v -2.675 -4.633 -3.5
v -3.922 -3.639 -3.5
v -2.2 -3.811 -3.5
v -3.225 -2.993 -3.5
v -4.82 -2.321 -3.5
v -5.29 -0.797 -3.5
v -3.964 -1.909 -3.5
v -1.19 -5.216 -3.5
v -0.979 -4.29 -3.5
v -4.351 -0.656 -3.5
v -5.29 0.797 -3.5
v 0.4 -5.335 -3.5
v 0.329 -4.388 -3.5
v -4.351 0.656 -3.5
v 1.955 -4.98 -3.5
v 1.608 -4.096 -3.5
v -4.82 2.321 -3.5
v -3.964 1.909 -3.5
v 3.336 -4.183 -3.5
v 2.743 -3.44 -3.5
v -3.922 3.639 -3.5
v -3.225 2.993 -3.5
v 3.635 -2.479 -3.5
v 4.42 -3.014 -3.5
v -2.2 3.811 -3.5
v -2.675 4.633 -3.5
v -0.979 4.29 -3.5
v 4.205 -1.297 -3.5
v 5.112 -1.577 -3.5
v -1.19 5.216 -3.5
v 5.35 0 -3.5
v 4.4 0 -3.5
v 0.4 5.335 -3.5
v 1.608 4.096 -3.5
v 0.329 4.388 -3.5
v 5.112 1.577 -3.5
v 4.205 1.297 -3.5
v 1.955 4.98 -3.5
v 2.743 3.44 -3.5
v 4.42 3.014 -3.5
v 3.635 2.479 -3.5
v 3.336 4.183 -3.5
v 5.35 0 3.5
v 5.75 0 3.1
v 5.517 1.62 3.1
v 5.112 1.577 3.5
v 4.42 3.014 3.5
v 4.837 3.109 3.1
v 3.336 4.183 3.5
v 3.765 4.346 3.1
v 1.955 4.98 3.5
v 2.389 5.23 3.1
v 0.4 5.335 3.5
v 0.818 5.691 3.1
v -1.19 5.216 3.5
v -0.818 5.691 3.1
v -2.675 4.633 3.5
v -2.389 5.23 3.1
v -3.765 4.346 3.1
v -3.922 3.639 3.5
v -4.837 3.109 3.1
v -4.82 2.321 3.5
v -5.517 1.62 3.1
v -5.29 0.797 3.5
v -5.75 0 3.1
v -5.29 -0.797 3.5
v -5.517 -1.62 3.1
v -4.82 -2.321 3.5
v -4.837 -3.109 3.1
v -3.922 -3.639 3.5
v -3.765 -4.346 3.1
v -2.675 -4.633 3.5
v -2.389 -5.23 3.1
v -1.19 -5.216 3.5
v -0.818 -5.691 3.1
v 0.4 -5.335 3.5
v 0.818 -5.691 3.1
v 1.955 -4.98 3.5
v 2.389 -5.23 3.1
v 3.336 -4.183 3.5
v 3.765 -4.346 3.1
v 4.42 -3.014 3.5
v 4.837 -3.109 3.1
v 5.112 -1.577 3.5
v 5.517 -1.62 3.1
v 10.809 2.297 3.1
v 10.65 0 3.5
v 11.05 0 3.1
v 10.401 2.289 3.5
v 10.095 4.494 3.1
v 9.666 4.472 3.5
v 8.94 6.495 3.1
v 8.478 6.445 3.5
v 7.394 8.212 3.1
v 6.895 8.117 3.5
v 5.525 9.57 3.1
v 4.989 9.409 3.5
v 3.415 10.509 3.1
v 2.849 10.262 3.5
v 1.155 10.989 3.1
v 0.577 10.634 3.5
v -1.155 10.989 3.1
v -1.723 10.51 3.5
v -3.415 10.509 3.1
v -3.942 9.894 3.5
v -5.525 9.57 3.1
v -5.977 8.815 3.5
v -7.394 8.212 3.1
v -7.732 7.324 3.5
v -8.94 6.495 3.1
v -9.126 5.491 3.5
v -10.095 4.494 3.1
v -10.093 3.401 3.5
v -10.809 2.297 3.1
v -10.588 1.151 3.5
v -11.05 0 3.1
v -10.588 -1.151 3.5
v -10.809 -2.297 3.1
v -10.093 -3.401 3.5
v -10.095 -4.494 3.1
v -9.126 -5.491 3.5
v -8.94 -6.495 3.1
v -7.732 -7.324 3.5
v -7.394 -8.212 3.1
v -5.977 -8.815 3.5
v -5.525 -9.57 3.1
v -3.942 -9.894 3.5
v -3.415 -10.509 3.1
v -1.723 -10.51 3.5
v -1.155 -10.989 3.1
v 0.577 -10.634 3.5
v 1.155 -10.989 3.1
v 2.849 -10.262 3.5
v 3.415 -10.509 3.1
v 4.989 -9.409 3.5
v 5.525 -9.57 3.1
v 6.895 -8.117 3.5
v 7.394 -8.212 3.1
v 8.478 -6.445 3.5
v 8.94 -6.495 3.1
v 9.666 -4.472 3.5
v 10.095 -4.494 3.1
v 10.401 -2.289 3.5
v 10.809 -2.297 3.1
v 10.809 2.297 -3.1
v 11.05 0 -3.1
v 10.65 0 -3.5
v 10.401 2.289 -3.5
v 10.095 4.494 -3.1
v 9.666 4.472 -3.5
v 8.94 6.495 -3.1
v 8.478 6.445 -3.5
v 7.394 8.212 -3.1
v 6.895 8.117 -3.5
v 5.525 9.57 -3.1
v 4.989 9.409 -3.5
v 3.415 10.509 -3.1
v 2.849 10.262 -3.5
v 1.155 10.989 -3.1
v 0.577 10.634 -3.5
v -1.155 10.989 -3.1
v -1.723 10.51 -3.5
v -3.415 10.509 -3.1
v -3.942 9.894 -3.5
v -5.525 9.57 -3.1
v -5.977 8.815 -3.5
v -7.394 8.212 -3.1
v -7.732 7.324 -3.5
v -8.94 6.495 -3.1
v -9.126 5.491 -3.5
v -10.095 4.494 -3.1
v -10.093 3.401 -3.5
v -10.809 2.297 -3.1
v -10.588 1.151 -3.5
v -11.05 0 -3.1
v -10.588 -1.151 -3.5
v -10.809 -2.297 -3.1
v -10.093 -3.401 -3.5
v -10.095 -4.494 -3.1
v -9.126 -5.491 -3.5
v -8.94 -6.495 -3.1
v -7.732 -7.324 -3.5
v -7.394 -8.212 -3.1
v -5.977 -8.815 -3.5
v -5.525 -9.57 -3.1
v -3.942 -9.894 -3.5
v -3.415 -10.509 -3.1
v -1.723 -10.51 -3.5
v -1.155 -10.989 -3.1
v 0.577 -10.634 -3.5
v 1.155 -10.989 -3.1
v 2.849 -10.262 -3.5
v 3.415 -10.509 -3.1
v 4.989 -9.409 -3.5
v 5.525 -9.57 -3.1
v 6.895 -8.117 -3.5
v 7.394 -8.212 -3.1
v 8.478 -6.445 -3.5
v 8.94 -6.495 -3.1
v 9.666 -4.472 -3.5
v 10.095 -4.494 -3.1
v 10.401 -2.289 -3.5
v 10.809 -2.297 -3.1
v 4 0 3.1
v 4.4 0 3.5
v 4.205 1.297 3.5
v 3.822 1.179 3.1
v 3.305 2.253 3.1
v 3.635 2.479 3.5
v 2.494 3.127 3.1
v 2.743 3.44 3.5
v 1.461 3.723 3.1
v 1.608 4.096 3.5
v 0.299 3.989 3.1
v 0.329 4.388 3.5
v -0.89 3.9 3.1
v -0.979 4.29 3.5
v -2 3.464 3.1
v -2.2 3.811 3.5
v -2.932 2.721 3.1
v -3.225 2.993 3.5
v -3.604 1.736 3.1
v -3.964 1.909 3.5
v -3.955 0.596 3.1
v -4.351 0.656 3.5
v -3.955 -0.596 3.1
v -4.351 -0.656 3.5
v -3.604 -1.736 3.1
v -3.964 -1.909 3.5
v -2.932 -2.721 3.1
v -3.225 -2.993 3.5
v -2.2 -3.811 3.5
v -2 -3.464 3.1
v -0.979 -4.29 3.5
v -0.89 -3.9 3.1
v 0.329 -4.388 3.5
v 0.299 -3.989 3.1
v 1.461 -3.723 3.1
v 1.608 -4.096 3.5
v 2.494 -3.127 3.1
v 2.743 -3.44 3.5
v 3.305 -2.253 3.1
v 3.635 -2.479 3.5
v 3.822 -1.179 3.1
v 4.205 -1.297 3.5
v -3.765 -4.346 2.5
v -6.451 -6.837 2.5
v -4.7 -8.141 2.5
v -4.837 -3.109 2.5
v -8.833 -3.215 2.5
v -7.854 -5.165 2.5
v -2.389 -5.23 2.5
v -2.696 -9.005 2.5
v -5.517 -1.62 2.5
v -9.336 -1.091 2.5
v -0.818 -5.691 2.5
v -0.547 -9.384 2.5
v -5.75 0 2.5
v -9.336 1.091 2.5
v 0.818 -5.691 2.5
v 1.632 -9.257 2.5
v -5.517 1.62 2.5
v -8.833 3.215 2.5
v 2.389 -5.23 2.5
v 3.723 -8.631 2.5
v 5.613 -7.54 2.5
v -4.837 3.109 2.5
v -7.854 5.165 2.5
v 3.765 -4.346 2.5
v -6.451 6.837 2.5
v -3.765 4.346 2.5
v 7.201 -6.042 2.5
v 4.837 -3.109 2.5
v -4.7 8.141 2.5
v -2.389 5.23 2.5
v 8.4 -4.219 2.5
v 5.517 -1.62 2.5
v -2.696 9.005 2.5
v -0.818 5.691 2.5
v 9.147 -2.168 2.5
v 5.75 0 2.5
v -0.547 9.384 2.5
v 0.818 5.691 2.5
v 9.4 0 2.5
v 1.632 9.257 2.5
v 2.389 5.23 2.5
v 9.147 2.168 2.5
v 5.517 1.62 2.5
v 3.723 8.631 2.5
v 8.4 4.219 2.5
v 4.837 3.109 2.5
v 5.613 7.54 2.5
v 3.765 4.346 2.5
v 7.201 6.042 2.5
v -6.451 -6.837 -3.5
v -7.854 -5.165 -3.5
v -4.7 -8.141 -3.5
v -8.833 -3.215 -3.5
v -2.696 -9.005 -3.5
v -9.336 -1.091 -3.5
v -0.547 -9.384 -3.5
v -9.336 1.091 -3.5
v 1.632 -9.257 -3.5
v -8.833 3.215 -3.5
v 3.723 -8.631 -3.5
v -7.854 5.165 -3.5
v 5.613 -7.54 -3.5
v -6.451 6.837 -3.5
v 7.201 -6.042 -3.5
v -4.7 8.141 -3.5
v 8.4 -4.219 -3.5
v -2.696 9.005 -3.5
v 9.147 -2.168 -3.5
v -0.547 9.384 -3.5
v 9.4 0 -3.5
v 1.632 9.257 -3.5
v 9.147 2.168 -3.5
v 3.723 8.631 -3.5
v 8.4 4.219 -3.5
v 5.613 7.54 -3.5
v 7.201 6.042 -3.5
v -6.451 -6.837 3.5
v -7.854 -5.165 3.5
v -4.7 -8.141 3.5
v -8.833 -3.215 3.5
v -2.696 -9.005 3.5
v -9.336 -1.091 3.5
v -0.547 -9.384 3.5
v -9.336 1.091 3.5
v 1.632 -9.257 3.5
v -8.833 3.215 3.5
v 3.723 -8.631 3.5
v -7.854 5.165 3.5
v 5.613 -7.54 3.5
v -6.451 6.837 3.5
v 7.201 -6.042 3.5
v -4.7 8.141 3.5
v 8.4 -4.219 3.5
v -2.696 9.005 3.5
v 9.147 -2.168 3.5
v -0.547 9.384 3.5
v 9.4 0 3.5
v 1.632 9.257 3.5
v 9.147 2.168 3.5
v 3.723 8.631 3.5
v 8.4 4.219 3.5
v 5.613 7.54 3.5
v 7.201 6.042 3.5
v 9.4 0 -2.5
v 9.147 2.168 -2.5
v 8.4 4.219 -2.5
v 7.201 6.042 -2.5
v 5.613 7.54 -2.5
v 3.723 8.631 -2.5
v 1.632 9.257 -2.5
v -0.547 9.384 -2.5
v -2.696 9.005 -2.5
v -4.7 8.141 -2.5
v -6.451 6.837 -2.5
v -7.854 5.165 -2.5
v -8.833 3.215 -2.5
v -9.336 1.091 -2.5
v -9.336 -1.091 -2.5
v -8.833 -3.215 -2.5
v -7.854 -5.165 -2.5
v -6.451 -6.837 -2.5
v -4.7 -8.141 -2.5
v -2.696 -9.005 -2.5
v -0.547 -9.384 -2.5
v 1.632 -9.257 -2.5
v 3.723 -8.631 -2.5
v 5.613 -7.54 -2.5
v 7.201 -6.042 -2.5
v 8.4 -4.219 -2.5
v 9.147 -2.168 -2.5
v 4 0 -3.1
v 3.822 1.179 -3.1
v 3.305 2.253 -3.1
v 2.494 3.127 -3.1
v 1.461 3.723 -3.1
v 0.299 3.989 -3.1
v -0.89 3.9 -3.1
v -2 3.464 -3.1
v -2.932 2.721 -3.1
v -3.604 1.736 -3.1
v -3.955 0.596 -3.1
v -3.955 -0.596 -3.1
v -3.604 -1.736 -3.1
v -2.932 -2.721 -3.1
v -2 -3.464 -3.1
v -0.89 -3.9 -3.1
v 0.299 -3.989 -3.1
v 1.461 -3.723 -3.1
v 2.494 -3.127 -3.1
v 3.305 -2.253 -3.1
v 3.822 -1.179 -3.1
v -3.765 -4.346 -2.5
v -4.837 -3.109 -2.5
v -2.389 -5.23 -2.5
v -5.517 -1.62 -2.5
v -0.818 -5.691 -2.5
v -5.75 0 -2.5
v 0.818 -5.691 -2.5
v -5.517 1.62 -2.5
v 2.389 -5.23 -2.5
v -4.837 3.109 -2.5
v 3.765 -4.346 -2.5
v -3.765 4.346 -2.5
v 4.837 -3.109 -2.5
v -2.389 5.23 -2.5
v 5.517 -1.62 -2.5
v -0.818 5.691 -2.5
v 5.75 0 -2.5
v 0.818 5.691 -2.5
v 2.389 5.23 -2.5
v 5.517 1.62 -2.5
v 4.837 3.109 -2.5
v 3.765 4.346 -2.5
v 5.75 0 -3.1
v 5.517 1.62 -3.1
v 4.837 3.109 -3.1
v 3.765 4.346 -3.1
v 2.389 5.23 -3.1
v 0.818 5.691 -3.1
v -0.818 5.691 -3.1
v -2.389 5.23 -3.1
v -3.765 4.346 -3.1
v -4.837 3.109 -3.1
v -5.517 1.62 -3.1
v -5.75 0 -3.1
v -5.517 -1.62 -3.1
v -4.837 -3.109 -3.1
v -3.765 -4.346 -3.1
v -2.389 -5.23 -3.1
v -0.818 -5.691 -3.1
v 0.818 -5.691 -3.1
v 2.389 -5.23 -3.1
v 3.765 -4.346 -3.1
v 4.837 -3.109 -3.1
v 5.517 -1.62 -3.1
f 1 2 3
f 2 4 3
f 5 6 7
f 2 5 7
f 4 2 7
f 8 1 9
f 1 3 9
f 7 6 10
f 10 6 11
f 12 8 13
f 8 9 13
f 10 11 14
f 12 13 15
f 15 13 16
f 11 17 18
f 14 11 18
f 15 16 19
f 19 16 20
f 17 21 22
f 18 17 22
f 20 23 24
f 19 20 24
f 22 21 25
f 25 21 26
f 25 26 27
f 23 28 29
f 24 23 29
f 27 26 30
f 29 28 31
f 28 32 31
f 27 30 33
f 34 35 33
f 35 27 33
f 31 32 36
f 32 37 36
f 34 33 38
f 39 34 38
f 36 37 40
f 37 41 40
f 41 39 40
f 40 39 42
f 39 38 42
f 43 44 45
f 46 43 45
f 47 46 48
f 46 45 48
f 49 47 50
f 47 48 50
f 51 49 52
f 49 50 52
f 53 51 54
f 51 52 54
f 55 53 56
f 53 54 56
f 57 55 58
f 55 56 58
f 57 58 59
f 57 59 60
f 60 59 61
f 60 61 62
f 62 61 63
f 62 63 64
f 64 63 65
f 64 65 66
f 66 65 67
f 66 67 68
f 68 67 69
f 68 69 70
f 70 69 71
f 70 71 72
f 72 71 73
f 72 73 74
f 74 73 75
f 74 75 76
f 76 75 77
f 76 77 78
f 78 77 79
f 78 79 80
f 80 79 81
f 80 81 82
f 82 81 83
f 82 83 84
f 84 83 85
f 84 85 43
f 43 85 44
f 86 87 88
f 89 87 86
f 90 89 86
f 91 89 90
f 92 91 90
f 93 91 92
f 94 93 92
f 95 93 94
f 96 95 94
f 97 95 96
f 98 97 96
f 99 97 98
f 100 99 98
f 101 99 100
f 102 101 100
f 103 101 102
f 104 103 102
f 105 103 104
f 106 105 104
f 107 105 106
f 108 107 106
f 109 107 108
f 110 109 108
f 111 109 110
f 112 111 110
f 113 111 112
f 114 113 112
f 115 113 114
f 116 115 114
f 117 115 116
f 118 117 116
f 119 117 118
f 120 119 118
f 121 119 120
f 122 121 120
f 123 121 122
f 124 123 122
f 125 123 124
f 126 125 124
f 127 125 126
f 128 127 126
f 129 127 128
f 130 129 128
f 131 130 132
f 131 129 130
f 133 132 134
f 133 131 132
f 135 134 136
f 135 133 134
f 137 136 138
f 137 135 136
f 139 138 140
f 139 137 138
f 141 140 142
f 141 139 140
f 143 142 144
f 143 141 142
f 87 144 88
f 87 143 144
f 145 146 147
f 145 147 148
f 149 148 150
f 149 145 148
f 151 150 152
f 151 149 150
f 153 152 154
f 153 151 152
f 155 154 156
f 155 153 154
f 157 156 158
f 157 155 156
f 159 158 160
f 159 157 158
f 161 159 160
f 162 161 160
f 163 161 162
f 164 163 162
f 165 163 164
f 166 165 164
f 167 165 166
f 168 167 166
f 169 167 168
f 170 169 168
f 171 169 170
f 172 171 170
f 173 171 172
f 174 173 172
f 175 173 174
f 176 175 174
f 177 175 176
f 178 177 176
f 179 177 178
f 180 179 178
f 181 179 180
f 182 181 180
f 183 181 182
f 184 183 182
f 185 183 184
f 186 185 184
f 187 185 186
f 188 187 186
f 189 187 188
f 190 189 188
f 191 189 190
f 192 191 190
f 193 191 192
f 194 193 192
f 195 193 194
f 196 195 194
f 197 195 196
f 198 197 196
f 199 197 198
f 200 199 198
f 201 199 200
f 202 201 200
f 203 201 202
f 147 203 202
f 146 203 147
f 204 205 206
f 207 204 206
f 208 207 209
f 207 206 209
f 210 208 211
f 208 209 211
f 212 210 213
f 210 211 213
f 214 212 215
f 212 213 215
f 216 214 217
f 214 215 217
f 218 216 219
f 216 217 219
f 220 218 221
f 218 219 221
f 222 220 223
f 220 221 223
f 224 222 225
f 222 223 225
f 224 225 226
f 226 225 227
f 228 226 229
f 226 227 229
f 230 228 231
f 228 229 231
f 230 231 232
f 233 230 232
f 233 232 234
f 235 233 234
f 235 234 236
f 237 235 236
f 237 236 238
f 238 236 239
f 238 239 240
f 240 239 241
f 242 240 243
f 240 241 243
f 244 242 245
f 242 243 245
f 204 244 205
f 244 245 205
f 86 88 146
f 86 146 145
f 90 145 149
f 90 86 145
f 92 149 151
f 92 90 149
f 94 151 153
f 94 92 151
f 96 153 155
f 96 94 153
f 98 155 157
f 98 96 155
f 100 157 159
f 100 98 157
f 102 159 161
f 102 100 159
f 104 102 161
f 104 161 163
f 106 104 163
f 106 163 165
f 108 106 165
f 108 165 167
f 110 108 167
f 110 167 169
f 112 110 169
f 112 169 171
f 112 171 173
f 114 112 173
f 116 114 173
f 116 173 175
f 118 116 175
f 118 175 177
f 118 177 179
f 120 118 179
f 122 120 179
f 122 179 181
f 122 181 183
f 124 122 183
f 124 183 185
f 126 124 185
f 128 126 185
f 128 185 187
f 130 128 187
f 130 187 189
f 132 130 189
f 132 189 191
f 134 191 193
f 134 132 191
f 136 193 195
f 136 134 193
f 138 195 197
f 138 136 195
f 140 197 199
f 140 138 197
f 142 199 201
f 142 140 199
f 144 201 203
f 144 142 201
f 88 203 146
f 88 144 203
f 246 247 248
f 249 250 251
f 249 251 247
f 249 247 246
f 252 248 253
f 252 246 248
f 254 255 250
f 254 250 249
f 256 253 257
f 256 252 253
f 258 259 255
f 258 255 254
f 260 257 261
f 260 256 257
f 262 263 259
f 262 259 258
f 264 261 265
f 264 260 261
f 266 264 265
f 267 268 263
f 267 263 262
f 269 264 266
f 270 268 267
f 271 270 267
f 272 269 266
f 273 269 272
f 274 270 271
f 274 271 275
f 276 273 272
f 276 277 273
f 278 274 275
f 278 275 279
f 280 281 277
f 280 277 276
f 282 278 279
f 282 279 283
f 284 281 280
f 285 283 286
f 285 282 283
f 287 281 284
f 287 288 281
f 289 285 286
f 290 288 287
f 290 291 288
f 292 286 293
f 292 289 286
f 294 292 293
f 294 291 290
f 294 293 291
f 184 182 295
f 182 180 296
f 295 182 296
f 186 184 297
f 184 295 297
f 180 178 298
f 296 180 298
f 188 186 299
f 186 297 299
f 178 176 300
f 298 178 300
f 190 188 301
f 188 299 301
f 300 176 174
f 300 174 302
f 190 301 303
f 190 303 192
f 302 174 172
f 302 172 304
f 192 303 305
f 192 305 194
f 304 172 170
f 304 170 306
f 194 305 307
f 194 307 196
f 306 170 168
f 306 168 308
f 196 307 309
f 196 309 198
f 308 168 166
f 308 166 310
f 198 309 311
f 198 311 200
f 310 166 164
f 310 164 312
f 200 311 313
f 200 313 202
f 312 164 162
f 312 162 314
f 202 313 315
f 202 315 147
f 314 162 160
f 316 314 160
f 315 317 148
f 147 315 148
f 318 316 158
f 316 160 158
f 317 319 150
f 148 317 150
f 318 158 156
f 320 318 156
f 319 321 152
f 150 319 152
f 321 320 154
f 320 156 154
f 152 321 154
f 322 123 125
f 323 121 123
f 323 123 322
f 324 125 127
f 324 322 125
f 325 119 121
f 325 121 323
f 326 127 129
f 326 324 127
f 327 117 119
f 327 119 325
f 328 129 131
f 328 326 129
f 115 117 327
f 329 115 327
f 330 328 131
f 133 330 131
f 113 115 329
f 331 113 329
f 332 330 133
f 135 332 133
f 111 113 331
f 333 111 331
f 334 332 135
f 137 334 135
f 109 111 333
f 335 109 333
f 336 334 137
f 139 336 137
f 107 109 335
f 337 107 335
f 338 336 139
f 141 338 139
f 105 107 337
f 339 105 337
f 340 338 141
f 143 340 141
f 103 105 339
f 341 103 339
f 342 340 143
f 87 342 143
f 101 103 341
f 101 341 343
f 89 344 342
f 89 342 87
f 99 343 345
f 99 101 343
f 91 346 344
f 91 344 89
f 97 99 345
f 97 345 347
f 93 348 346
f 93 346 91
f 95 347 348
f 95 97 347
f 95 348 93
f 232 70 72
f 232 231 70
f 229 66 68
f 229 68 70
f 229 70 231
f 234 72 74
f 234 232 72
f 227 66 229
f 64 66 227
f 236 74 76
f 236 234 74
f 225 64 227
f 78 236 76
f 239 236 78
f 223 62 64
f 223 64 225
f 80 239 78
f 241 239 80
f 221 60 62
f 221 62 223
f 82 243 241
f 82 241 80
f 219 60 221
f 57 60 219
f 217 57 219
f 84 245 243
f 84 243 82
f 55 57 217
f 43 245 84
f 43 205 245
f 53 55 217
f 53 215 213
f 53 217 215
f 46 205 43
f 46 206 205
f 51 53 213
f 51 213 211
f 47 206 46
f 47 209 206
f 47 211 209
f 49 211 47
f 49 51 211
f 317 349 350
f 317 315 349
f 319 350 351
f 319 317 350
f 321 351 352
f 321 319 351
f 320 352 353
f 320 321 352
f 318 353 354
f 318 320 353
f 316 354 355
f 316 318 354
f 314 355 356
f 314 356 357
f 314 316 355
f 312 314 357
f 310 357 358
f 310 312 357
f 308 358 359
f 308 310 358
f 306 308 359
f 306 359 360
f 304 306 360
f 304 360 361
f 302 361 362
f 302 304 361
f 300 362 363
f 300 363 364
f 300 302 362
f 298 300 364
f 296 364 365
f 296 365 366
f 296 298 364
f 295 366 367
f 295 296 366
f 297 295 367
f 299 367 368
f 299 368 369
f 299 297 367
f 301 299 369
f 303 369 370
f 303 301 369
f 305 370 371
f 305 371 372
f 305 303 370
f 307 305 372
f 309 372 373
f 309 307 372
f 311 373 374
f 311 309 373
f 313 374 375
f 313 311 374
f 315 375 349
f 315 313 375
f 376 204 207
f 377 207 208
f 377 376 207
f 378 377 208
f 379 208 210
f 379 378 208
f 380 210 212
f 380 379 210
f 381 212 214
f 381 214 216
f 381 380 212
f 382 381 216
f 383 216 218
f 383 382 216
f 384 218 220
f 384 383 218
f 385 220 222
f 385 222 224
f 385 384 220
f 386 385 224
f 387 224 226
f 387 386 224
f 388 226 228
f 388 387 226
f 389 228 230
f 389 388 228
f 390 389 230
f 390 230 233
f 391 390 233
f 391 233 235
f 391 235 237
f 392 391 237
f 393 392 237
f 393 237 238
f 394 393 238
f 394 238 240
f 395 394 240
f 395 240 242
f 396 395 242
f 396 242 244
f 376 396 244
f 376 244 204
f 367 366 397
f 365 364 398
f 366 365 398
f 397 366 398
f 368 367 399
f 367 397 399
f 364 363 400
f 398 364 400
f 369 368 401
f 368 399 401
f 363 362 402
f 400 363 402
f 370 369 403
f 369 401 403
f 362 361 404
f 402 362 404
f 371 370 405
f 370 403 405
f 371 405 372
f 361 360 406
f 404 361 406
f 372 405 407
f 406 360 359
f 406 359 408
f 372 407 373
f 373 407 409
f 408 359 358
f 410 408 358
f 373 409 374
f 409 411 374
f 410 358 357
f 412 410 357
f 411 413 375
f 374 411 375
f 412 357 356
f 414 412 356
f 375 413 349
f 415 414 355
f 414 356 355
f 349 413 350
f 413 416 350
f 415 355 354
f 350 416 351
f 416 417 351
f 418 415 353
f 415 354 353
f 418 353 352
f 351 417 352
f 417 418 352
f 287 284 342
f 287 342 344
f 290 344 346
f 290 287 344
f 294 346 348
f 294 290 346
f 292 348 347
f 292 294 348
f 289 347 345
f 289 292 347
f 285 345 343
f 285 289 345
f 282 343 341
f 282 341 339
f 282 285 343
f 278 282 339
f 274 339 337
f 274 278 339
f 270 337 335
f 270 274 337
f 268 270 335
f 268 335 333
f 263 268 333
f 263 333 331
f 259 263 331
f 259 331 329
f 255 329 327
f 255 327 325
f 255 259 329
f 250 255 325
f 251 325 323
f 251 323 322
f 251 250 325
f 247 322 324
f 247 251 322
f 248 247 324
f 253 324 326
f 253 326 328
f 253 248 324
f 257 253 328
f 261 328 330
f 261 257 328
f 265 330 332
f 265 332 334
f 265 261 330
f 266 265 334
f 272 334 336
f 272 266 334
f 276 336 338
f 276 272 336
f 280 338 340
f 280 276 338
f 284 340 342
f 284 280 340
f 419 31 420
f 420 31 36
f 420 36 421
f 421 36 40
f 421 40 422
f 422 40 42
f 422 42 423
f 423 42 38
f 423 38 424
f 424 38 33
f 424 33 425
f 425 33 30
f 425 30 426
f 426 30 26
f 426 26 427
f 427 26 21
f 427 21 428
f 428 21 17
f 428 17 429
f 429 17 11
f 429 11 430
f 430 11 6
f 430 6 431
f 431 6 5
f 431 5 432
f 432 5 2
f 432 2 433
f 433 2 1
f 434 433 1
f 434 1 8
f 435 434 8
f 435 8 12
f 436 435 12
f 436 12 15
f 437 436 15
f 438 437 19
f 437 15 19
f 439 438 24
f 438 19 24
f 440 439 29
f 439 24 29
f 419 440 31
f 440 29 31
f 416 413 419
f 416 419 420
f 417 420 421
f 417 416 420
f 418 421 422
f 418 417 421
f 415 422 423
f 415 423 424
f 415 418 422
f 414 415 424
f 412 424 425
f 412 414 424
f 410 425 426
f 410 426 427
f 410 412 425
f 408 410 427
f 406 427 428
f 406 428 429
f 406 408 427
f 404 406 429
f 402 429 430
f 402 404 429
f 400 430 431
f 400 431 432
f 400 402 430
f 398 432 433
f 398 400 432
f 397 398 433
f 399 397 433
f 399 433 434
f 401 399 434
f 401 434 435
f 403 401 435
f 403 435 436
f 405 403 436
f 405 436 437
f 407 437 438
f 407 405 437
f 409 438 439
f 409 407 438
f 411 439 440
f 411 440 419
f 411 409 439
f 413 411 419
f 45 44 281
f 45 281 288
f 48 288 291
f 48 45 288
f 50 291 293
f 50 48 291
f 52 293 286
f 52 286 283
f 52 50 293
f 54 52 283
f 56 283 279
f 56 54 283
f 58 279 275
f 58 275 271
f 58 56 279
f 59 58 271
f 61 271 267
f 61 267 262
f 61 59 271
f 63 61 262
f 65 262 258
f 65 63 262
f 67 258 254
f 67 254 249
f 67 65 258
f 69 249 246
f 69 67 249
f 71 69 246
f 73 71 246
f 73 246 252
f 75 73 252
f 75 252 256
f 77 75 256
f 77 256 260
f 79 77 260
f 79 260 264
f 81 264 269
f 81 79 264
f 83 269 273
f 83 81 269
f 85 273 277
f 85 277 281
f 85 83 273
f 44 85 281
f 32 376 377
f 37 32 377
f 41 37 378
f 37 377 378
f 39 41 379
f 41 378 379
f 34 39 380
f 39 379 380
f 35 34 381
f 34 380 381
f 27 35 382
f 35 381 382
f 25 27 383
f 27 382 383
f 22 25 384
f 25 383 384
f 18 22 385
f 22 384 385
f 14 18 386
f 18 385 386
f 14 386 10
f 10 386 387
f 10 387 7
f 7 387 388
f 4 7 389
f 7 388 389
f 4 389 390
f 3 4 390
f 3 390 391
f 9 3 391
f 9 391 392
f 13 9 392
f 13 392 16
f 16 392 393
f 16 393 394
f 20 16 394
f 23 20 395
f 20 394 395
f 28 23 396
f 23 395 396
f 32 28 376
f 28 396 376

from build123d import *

# Parameters (mm, degrees)
F0_R     = 11.05
F0_R_2   = 9.4
F1_DEPTH = 3.5
F0_R_3   = 5.75
F0_R_4   = 4
F2_DEPTH = 2.5
F3_SIZE  = 0.4


with BuildPart() as f1:
    # F0 (on Top) → F1 (new body, symmetric)
    with BuildSketch(Plane.XY):
        Circle(F0_R)
        Circle(F0_R_2, mode=Mode.SUBTRACT)
    extrude(amount=F1_DEPTH, both=True)



with BuildPart() as f1b:
    # F0 (on Top) → F1, piece 2 (new body, symmetric)
    with BuildSketch(Plane.XY):
        Circle(F0_R_3)
        Circle(F0_R_4, mode=Mode.SUBTRACT)
    extrude(amount=F1_DEPTH, both=True)


with BuildPart() as f1_1:
    add(f1.part)

    add(f1b.part)  # F2 merges F1b
    # F0 (on Top) → F2 (join, symmetric)
    with BuildSketch(Plane.XY):
        Circle(F0_R_2)
        Circle(F0_R_3, mode=Mode.SUBTRACT)
    extrude(amount=F2_DEPTH, both=True)

    # F3
    f3_edges = [f1_1.edges().sort_by_distance(p)[0] for p in [
        (-11.05, 0, 3.5),
        (-11.05, 0, -3.5),
        (-4, 0, 3.5),
        (-5.75, 0, 3.5),
        (-5.75, 0, -3.5),
        (-4, 0, -3.5),
    ]]
    chamfer(f3_edges, length=F3_SIZE)


solid = f1_1.part
